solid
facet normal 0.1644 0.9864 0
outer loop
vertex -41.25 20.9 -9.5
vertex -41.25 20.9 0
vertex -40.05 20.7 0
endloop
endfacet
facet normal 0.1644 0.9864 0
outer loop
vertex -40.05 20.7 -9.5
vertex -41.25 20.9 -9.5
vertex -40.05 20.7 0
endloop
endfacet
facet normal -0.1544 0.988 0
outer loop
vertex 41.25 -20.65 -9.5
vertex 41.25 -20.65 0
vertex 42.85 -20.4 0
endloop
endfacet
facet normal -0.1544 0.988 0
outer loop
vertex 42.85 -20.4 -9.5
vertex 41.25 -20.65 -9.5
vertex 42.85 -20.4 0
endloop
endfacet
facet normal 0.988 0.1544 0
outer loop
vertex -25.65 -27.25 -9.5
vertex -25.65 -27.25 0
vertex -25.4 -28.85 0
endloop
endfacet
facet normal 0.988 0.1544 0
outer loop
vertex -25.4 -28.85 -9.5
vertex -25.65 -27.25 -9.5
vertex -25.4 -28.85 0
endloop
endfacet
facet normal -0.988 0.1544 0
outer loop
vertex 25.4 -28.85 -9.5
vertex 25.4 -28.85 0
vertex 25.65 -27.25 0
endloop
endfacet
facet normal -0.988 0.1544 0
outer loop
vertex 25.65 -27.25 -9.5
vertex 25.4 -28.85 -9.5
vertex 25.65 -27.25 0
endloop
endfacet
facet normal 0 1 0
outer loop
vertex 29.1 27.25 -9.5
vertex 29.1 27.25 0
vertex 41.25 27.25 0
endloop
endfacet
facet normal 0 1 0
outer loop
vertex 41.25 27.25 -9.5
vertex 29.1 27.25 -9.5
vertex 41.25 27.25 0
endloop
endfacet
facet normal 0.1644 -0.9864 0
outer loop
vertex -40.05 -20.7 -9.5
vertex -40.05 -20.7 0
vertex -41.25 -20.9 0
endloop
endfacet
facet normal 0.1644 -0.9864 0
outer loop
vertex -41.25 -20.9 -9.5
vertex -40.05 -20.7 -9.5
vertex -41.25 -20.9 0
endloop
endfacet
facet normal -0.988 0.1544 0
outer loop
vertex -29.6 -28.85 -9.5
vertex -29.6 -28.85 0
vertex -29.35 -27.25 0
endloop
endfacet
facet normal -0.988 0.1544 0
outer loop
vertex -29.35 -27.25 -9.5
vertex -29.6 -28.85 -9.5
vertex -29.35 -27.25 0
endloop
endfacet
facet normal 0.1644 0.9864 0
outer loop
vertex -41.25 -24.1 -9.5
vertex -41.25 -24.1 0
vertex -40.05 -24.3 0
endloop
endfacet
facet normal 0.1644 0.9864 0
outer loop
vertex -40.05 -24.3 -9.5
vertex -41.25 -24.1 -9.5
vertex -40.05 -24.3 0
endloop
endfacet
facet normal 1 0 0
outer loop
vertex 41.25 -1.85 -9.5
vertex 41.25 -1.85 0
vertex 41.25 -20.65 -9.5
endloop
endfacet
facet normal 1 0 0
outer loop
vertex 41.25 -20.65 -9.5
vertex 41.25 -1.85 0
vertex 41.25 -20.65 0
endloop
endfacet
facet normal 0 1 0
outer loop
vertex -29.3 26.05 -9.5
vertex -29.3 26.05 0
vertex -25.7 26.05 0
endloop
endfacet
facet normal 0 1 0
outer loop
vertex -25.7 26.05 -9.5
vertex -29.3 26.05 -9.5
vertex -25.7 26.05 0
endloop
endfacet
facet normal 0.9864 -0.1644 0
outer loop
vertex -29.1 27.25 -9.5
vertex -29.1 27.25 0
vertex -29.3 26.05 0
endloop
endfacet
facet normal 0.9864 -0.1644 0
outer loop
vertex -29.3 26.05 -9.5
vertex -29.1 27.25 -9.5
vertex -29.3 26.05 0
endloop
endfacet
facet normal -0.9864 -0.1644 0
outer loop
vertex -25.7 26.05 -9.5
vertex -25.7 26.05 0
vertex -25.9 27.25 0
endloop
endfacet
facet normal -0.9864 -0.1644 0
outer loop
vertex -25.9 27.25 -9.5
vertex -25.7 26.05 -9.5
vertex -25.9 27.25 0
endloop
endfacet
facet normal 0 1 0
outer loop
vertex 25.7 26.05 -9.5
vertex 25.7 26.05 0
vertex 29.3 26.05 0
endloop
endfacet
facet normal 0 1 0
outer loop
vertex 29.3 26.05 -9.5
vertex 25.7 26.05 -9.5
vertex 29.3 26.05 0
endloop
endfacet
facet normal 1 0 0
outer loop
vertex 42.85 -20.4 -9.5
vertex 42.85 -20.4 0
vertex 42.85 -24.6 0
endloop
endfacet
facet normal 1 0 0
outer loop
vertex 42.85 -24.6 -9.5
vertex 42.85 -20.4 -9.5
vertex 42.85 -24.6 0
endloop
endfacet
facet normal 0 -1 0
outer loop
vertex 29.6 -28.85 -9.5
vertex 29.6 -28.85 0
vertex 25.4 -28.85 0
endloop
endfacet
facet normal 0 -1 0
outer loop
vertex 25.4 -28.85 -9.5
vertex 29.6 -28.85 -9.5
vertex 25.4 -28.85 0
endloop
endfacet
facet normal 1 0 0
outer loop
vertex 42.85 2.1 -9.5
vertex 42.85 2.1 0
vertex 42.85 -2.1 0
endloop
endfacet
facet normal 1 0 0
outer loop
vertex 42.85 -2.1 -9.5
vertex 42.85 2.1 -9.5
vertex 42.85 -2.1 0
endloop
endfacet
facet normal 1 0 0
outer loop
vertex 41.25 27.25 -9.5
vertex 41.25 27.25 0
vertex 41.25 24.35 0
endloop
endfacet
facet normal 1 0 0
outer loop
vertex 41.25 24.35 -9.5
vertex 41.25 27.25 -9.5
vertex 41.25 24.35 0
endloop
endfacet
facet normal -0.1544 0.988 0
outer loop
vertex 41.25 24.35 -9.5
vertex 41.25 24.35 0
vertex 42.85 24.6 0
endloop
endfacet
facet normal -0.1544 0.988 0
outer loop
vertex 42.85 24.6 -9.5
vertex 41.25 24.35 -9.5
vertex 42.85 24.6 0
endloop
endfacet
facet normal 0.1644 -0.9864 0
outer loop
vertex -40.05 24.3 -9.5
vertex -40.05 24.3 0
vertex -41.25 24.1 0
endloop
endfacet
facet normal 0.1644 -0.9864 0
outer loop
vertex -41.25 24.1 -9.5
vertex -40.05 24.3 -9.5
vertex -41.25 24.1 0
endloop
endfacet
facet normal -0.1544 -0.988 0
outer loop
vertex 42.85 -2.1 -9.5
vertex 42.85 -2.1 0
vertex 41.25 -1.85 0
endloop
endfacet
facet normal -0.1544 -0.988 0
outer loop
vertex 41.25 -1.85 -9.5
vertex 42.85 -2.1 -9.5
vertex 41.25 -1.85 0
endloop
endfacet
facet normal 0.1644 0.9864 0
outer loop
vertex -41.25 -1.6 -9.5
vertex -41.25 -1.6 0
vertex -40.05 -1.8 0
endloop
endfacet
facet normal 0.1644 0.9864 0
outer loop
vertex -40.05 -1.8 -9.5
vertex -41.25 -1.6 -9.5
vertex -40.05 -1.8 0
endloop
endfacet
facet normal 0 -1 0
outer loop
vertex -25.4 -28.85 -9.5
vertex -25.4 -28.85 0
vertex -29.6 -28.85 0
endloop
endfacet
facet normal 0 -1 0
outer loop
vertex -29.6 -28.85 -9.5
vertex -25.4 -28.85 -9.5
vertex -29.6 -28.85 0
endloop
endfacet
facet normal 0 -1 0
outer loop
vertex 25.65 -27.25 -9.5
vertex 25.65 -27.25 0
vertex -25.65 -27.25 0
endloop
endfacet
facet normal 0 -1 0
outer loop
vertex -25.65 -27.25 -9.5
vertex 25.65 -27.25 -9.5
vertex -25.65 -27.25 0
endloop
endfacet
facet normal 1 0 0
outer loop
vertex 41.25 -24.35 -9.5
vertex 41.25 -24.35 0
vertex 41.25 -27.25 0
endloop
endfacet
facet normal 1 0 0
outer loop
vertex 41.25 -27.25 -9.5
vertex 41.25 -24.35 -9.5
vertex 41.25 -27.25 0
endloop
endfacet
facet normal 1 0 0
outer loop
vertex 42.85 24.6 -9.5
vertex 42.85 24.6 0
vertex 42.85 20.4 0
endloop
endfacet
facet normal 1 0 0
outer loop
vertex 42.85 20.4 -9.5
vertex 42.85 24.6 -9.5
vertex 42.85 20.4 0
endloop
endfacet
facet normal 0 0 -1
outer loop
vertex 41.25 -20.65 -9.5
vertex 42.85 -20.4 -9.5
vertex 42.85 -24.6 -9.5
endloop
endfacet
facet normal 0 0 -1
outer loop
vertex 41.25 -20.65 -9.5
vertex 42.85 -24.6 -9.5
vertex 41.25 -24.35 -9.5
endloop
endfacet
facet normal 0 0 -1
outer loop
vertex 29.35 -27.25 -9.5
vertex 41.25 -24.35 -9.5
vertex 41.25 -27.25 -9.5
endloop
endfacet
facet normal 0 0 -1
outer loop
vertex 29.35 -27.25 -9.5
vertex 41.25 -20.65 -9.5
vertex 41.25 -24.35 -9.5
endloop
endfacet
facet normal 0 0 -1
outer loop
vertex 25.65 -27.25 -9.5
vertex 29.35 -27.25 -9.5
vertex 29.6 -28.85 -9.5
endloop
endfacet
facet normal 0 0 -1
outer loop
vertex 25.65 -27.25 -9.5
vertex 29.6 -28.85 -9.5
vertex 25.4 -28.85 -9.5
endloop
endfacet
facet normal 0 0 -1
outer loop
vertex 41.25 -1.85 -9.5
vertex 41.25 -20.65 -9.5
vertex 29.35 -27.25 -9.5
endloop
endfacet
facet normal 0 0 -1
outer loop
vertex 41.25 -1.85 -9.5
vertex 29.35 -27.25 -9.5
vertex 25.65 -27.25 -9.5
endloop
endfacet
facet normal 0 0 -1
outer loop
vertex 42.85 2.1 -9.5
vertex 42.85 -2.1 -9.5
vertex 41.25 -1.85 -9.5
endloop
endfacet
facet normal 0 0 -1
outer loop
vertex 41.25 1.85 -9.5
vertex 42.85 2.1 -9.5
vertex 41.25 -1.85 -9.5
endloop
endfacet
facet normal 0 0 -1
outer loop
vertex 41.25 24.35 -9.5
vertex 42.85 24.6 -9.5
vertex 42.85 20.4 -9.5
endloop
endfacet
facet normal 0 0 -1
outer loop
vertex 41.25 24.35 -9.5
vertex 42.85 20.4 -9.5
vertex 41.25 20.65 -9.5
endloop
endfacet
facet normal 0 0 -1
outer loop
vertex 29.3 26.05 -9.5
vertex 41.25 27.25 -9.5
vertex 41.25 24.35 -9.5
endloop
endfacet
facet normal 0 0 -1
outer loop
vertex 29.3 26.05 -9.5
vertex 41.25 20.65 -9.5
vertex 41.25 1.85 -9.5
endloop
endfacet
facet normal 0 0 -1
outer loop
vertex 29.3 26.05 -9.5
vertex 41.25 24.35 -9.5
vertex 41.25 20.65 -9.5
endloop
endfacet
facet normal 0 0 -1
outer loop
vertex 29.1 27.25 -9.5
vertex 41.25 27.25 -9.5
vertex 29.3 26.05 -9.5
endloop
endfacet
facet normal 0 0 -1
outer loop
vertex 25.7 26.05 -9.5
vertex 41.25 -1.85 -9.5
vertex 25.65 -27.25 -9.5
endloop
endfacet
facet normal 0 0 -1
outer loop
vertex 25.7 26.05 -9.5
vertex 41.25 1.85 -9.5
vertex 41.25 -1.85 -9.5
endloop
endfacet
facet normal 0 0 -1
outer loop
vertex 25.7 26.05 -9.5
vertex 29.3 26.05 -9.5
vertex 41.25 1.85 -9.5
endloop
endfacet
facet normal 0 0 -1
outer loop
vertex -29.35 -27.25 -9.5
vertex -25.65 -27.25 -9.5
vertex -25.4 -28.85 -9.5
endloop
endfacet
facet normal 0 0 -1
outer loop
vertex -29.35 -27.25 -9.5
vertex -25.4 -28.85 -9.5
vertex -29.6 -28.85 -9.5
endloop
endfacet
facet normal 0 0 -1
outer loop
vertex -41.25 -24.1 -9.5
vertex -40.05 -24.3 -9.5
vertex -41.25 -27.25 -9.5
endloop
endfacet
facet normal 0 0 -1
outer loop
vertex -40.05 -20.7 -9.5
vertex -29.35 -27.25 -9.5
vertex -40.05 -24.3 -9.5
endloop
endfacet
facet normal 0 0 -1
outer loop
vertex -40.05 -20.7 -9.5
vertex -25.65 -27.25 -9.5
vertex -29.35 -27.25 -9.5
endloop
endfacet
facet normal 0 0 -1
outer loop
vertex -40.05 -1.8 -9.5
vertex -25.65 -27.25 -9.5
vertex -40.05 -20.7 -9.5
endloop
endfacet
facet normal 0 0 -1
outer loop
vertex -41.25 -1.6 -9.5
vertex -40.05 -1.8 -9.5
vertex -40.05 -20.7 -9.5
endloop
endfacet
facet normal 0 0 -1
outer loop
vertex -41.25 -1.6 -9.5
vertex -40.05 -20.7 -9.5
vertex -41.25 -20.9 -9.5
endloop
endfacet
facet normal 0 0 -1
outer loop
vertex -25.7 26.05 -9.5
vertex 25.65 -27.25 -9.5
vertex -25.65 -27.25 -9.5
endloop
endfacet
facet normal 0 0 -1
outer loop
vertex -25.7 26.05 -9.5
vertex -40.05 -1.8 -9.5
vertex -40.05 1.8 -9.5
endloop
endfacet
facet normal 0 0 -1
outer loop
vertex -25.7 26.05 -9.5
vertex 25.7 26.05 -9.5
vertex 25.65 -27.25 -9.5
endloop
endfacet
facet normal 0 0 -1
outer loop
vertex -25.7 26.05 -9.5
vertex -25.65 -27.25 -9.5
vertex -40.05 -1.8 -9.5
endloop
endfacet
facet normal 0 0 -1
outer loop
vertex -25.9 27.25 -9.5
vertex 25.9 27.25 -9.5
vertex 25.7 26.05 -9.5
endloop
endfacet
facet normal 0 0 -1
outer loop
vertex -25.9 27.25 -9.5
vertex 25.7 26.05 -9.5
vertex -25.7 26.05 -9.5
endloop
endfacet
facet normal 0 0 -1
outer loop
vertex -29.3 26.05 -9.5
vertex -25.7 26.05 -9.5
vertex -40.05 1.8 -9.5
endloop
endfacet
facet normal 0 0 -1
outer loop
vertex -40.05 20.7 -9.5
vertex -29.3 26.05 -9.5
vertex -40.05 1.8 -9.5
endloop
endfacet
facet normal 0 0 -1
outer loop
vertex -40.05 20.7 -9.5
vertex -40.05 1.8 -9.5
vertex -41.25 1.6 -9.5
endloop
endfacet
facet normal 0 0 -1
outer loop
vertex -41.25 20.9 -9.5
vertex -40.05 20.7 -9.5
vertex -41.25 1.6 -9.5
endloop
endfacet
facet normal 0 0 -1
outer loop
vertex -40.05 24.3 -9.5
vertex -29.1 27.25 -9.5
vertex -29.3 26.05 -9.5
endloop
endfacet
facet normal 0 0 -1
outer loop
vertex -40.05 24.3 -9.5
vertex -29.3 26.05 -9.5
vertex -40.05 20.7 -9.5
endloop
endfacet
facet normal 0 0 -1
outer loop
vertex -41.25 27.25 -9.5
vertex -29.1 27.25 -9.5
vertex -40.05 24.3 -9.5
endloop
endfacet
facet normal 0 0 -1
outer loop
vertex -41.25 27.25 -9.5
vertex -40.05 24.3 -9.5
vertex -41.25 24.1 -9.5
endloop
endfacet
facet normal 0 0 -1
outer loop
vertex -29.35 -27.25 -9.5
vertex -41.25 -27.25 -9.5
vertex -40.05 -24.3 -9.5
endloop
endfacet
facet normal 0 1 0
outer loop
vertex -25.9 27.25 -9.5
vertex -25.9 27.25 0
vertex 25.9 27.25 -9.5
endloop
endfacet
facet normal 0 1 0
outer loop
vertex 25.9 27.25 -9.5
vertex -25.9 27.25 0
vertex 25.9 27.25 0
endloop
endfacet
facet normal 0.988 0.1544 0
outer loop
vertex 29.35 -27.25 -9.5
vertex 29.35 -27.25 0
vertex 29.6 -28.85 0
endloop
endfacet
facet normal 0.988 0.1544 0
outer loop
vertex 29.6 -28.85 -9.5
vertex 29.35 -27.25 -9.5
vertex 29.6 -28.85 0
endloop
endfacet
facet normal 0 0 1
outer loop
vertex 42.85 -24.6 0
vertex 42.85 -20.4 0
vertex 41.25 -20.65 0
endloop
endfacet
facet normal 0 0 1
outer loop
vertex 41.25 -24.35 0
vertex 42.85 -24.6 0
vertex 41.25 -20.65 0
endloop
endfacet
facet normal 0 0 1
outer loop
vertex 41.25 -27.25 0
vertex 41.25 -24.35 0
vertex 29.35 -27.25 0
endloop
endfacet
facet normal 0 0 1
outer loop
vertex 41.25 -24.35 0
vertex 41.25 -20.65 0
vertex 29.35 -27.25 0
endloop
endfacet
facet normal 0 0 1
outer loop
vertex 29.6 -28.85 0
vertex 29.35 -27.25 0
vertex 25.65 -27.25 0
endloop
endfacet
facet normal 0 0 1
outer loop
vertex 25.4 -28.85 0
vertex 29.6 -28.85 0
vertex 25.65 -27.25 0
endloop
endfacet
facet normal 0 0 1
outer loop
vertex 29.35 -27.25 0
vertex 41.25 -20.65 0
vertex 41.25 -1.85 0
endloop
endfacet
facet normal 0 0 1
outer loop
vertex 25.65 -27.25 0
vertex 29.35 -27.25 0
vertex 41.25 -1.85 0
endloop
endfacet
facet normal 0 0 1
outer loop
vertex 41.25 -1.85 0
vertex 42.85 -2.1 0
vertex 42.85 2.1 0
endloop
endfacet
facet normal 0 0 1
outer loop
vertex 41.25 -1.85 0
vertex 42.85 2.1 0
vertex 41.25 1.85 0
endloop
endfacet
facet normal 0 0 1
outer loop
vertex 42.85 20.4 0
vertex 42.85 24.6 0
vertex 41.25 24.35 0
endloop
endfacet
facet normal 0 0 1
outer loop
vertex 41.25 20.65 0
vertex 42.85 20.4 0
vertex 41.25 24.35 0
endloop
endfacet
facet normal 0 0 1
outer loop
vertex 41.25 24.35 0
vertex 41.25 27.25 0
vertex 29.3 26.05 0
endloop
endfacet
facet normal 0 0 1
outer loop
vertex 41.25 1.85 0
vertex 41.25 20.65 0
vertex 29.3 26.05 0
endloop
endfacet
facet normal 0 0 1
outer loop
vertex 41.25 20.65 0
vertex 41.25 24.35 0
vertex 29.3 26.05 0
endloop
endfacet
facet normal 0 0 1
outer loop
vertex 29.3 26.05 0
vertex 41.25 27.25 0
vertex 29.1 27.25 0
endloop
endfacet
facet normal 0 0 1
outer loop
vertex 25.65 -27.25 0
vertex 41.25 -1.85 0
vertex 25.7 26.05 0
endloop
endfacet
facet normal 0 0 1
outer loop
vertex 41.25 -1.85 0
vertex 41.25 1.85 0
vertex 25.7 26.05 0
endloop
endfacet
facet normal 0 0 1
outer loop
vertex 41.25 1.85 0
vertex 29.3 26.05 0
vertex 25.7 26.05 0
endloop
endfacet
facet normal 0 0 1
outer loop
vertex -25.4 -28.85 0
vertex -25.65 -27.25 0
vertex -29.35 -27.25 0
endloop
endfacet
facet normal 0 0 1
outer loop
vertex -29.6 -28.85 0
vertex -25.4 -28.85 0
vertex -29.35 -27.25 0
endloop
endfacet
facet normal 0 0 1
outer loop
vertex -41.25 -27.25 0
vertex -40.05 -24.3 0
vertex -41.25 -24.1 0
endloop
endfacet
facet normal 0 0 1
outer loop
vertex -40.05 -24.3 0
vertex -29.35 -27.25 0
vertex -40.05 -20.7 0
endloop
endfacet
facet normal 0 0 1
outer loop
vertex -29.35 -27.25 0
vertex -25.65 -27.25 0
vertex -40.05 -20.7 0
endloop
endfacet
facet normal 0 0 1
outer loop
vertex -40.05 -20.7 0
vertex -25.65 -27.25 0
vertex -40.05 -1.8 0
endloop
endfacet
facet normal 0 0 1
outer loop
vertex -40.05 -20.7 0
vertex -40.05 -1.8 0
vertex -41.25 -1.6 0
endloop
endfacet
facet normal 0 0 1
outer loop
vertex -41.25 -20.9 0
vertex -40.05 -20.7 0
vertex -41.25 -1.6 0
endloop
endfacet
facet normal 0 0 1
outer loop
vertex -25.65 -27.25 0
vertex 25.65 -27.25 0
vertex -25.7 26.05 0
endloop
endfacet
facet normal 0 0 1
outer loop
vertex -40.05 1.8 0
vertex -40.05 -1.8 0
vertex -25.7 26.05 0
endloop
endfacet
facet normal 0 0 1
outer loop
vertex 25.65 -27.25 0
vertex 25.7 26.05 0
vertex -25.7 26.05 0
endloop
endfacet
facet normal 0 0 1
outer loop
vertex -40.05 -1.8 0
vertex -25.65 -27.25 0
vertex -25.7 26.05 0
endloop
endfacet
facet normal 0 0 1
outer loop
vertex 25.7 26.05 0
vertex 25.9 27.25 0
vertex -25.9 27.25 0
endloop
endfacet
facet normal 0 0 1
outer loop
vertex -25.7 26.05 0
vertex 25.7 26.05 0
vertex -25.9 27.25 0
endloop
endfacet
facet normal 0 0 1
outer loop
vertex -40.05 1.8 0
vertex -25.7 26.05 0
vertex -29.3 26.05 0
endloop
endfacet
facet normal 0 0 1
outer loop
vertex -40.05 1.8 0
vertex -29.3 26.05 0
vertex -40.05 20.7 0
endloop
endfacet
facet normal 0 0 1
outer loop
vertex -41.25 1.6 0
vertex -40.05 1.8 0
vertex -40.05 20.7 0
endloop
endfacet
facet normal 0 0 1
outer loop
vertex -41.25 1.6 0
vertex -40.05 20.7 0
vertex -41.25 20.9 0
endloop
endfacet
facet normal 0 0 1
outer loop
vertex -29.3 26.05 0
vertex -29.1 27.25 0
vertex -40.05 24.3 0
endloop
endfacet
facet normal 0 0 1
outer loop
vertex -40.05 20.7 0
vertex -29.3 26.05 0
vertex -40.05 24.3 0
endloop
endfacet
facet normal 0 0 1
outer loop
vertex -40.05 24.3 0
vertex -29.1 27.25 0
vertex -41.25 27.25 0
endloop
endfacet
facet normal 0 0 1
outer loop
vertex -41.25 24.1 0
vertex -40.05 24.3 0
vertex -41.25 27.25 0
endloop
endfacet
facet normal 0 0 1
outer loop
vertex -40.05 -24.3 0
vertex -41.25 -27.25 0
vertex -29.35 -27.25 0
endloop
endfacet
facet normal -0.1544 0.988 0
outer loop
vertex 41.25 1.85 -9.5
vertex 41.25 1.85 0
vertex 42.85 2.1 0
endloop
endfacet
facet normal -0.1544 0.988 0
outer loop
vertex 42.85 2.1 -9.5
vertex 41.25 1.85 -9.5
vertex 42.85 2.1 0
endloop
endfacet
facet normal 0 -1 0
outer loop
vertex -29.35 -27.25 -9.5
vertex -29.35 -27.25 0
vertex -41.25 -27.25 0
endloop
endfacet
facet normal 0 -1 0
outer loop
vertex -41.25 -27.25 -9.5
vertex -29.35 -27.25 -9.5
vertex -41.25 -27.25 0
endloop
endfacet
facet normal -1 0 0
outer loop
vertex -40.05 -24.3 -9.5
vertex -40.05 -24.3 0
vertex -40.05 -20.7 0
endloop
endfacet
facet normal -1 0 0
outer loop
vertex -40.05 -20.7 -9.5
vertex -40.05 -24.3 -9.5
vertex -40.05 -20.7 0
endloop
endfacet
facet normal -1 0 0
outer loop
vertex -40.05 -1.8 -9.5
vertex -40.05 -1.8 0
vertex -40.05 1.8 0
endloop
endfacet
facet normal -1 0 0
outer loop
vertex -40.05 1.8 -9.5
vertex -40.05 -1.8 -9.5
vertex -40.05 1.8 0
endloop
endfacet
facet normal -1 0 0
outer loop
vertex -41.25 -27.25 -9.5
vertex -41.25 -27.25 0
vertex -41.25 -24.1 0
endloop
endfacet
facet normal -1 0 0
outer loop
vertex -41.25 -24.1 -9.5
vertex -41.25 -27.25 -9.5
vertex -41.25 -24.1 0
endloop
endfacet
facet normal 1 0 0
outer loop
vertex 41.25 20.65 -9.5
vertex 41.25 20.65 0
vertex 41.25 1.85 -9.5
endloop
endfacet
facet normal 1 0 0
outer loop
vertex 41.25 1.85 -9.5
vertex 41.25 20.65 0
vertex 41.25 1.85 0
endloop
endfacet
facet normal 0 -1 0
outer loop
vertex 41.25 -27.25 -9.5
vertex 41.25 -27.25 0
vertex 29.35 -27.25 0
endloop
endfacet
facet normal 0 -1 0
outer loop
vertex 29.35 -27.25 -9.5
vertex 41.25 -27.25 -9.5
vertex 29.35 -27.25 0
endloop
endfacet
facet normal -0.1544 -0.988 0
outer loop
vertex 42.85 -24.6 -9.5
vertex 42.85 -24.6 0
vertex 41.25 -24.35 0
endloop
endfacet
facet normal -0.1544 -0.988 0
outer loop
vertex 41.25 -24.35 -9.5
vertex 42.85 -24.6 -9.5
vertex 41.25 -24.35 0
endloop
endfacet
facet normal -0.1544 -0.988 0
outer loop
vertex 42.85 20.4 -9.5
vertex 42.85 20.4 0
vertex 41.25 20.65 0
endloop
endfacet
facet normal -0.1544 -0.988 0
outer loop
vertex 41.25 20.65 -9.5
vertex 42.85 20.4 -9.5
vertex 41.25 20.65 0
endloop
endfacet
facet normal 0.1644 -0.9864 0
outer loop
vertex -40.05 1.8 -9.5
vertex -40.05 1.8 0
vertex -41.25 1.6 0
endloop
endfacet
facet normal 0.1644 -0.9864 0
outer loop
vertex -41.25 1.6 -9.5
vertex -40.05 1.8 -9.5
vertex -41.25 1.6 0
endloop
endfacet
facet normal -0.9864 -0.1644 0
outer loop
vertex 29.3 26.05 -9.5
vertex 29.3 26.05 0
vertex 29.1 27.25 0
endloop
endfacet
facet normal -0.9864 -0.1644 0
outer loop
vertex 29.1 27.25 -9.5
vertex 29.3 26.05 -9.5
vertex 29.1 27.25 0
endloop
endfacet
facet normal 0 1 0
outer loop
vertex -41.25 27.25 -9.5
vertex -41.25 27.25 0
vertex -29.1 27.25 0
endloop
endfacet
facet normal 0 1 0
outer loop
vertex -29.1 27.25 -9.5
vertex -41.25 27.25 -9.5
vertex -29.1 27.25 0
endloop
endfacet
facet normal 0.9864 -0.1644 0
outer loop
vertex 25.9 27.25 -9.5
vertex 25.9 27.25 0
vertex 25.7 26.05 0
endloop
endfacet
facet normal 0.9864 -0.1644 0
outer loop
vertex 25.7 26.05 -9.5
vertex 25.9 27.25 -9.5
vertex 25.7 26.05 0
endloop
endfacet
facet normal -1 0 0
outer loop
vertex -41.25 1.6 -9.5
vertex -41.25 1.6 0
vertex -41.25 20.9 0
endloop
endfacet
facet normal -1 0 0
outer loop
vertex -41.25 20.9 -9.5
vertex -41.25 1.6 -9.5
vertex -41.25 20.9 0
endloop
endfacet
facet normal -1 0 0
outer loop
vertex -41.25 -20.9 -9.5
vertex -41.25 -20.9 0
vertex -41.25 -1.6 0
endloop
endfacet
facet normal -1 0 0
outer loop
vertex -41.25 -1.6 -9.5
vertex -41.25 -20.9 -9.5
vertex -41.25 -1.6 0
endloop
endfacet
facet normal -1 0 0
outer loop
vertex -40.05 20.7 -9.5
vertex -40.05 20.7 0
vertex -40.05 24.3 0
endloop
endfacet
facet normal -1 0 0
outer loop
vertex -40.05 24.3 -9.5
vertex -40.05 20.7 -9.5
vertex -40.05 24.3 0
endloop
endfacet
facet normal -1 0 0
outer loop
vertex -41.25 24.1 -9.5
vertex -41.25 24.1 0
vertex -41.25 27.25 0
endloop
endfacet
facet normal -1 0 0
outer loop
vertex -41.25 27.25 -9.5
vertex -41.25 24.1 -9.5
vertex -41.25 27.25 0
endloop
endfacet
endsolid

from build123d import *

# Parameters (mm, degrees)
PAD_DEPTH = 9.5


with BuildPart() as part:
    # Sketch → Pad (new body)
    with BuildSketch(Plane.XY):
        Polygon((-41.25, 27.25), (-29.1, 27.25), (-29.3, 26.05), (-25.7, 26.05), (-25.9, 27.25), (25.9, 27.25), (25.7, 26.05), (29.3, 26.05), (29.1, 27.25), (41.25, 27.25), (41.25, 24.35), (42.85, 24.6), (42.85, 20.4), (41.25, 20.65), (41.25, 1.85), (42.85, 2.1), (42.85, -2.1), (41.25, -1.85), (41.25, -20.65), (42.85, -20.4), (42.85, -24.6), (41.25, -24.35), (41.25, -27.25), (29.35, -27.25), (29.6, -28.85), (25.4, -28.85), (25.65, -27.25), (-25.65, -27.25), (-25.4, -28.85), (-29.6, -28.85), (-29.35, -27.25), (-41.25, -27.25), (-41.25, -24.1), (-40.05, -24.3), (-40.05, -20.7), (-41.25, -20.9), (-41.25, -1.6), (-40.05, -1.8), (-40.05, 1.8), (-41.25, 1.6), (-41.25, 20.9), (-40.05, 20.7), (-40.05, 24.3), (-41.25, 24.1), align=None)
    extrude(amount=-PAD_DEPTH)


solid = part.part
